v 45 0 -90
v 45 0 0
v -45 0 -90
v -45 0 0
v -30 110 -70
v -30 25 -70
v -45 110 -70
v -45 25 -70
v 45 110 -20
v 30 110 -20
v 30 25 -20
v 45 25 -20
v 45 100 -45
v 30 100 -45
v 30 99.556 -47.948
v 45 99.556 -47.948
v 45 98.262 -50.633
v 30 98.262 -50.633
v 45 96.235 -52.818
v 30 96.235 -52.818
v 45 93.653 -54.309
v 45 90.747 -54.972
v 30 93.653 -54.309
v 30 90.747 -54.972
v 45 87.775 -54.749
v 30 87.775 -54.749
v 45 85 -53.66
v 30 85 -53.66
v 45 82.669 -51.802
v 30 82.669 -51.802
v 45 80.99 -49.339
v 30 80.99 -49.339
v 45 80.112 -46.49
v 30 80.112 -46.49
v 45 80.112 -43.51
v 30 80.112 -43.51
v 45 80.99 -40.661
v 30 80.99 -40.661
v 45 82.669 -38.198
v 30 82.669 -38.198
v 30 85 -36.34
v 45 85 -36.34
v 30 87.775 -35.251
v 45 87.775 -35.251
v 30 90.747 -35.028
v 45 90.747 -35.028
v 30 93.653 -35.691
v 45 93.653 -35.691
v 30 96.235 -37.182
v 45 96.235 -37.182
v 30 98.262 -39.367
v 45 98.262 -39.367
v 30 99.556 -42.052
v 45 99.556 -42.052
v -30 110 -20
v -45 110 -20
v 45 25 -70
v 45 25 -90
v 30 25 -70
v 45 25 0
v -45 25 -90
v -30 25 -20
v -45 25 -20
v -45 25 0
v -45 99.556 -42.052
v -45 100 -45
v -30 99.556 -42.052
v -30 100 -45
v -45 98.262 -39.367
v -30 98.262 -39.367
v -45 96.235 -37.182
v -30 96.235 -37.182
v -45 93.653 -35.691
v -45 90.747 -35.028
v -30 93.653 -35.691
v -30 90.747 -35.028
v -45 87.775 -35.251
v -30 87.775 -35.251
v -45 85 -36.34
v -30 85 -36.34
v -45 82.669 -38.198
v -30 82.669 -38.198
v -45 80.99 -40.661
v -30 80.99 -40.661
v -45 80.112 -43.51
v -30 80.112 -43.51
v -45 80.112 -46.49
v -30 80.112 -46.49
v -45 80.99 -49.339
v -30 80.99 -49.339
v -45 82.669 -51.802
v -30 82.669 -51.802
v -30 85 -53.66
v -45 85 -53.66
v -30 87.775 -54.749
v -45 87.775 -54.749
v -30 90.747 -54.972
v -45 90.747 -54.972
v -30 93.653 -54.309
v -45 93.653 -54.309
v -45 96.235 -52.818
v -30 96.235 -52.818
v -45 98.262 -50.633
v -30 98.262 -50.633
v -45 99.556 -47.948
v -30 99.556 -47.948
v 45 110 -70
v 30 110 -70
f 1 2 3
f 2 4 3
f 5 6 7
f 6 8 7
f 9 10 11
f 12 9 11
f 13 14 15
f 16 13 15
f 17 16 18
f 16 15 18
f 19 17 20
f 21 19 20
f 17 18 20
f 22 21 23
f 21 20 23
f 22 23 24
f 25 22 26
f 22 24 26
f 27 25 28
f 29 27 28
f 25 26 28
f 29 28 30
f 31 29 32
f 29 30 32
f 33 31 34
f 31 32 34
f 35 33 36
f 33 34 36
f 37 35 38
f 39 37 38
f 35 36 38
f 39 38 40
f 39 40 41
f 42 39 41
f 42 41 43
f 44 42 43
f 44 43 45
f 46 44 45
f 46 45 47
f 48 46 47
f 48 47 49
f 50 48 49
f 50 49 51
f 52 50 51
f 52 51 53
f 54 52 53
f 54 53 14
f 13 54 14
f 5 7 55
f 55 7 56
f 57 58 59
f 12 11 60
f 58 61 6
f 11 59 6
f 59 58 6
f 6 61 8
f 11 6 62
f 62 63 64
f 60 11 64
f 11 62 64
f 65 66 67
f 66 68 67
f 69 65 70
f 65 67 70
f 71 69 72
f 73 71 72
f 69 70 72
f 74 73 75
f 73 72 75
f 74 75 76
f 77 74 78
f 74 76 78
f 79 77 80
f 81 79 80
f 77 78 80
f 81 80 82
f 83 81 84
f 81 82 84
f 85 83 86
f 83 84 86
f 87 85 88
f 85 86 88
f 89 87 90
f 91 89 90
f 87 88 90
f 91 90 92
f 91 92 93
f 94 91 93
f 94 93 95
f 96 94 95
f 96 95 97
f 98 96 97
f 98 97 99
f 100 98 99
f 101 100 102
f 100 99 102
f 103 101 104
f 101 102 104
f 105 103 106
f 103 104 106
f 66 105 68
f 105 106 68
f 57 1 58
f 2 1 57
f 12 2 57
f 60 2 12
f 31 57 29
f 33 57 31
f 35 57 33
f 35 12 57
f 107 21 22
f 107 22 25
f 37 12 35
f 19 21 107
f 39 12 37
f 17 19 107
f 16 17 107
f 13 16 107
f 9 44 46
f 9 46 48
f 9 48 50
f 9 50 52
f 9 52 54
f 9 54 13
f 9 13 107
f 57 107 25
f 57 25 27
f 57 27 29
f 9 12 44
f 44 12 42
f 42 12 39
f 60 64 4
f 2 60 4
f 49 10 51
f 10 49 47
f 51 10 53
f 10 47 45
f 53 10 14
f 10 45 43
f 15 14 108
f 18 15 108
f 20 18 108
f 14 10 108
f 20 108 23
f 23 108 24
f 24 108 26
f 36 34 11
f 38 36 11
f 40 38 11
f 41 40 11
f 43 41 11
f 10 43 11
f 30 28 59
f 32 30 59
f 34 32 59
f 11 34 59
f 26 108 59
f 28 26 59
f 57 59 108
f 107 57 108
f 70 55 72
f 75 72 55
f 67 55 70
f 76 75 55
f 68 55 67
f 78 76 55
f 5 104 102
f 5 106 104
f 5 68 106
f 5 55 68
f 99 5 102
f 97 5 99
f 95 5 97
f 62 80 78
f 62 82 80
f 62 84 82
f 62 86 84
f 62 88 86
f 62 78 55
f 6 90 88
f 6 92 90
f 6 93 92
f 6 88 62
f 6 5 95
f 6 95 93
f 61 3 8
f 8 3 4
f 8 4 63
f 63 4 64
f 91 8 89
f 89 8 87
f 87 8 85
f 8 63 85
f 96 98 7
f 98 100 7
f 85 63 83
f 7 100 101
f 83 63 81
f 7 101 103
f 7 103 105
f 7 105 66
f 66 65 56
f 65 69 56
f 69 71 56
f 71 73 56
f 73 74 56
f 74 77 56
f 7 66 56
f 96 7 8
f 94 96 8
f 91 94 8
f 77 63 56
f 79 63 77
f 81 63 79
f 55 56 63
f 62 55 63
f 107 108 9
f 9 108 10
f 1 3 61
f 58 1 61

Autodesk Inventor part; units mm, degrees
ref_plane "YZ Plane" through (0, 0, 0) normal (1, 0, 0) x (0, 1, 0)
ref_plane "XZ Plane" through (0, 0, 0) normal (0, 1, 0) x (-1, 0, 0)
sketch "Sketch1" plane through (0, 0, 0) normal (1, 0, 0) x (0, 1, 0)
  line L0 (0, 0) -> (90, 0)
  line L1 (90, 0) -> (90, -90)
  line L2 (90, -90) -> (0, -90)
  line L3 (0, -90) -> (0, 0)
  dimension "d0" = 90
  dimension "d1" = 90
ref_plane "Work Plane1" through (0, 90, 0) normal (1, 0, 0) x (0, 1, 0)
sketch "Sketch2" plane through (0, 90, 0) normal (1, 0, 0) x (0, 1, 0)
  line L0 (20, -20) -> (-65, -20)
  line L1 (-65, -20) -> (-65, 0)
  line L2 (-65, 0) -> (-90, 0)
  line L3 (-90, 0) -> (-90, -90)
  line L4 (-90, -90) -> (-65, -90)
  line L5 (-65, -90) -> (-65, -70)
  line L6 (-65, -70) -> (20, -70)
  line L7 (20, -70) -> (20, -20)
  line L8 (0, -90) -> (0, 0) projected
  line L9 (0, 0) -> (0, -90)
  line L10 (-90, 0) -> (-90, -90) projected
  line L11 (0, -90) -> (-90, -90)
  line L12 (-90, -90) -> (-90, 0)
  line L13 (-90, 0) -> (0, 0)
  line L14 (0, -45) -> (-90, -45) construction
  circle A0 centre (0, -45) radius 10
  point P0 (20, -45)
  point P1 (-90, -45)
  point P2 (0, -70)
  point P3 (-65, 0)
  point P4 (0, -20)
  point P5 (0, -35)
  point P6 (0, -55)
  dimension "d4" = 90
  dimension "d7" = 50
  dimension "d10" = 20
  dimension "d11" = 90
  dimension "d13" = 25
  dimension "d14" = 25
  dimension "d27" = 110
ref_plane "Work Plane2" through (45, 110, -45) normal (0, 0, 1) x (1, 0, 0)
sketch "Sketch4" plane through (45, 110, -45) normal (0, 0, 1) x (1, 0, 0)
  line L0 (-90, 0) -> (0, 0) projected
  line L1 (-90, 0) -> (0, 0)
  line L2 (0, 0) -> (0, -110)
  line L3 (0, -110) -> (-90, -110)
  line L4 (-90, -110) -> (-90, 0)
  line L5 (-90, 0) -> (-75, 0)
  line L6 (-75, 0) -> (-15, 0)
  line L7 (-15, 0) -> (0, 0)
  line L8 (0, -110) -> (0, 0)
  line L9 (0, -110) -> (0, -85)
  line L10 (0, -85) -> (-90, -85)
  line L11 (-75, 0) -> (-75, -85)
  line L12 (-15, 0) -> (-15, -85)
  point P0 (-45, -110)
  dimension "d22" = 15
  dimension "d23" = 60
  dimension "d24" = 25
  dimension "d28" = 110
extrude "Extrusion6" add sketch "Sketch2" along normal mid plane 90 contours L7 L6 L8 A0 L0 | L8 A0 L6 L5 L4 L3 L2 L1 L0
extrude "Extrusion7" cut sketch "Sketch4" along normal mid plane 90 contours L0 L12 L10 L11
properties part number "CT_01"
